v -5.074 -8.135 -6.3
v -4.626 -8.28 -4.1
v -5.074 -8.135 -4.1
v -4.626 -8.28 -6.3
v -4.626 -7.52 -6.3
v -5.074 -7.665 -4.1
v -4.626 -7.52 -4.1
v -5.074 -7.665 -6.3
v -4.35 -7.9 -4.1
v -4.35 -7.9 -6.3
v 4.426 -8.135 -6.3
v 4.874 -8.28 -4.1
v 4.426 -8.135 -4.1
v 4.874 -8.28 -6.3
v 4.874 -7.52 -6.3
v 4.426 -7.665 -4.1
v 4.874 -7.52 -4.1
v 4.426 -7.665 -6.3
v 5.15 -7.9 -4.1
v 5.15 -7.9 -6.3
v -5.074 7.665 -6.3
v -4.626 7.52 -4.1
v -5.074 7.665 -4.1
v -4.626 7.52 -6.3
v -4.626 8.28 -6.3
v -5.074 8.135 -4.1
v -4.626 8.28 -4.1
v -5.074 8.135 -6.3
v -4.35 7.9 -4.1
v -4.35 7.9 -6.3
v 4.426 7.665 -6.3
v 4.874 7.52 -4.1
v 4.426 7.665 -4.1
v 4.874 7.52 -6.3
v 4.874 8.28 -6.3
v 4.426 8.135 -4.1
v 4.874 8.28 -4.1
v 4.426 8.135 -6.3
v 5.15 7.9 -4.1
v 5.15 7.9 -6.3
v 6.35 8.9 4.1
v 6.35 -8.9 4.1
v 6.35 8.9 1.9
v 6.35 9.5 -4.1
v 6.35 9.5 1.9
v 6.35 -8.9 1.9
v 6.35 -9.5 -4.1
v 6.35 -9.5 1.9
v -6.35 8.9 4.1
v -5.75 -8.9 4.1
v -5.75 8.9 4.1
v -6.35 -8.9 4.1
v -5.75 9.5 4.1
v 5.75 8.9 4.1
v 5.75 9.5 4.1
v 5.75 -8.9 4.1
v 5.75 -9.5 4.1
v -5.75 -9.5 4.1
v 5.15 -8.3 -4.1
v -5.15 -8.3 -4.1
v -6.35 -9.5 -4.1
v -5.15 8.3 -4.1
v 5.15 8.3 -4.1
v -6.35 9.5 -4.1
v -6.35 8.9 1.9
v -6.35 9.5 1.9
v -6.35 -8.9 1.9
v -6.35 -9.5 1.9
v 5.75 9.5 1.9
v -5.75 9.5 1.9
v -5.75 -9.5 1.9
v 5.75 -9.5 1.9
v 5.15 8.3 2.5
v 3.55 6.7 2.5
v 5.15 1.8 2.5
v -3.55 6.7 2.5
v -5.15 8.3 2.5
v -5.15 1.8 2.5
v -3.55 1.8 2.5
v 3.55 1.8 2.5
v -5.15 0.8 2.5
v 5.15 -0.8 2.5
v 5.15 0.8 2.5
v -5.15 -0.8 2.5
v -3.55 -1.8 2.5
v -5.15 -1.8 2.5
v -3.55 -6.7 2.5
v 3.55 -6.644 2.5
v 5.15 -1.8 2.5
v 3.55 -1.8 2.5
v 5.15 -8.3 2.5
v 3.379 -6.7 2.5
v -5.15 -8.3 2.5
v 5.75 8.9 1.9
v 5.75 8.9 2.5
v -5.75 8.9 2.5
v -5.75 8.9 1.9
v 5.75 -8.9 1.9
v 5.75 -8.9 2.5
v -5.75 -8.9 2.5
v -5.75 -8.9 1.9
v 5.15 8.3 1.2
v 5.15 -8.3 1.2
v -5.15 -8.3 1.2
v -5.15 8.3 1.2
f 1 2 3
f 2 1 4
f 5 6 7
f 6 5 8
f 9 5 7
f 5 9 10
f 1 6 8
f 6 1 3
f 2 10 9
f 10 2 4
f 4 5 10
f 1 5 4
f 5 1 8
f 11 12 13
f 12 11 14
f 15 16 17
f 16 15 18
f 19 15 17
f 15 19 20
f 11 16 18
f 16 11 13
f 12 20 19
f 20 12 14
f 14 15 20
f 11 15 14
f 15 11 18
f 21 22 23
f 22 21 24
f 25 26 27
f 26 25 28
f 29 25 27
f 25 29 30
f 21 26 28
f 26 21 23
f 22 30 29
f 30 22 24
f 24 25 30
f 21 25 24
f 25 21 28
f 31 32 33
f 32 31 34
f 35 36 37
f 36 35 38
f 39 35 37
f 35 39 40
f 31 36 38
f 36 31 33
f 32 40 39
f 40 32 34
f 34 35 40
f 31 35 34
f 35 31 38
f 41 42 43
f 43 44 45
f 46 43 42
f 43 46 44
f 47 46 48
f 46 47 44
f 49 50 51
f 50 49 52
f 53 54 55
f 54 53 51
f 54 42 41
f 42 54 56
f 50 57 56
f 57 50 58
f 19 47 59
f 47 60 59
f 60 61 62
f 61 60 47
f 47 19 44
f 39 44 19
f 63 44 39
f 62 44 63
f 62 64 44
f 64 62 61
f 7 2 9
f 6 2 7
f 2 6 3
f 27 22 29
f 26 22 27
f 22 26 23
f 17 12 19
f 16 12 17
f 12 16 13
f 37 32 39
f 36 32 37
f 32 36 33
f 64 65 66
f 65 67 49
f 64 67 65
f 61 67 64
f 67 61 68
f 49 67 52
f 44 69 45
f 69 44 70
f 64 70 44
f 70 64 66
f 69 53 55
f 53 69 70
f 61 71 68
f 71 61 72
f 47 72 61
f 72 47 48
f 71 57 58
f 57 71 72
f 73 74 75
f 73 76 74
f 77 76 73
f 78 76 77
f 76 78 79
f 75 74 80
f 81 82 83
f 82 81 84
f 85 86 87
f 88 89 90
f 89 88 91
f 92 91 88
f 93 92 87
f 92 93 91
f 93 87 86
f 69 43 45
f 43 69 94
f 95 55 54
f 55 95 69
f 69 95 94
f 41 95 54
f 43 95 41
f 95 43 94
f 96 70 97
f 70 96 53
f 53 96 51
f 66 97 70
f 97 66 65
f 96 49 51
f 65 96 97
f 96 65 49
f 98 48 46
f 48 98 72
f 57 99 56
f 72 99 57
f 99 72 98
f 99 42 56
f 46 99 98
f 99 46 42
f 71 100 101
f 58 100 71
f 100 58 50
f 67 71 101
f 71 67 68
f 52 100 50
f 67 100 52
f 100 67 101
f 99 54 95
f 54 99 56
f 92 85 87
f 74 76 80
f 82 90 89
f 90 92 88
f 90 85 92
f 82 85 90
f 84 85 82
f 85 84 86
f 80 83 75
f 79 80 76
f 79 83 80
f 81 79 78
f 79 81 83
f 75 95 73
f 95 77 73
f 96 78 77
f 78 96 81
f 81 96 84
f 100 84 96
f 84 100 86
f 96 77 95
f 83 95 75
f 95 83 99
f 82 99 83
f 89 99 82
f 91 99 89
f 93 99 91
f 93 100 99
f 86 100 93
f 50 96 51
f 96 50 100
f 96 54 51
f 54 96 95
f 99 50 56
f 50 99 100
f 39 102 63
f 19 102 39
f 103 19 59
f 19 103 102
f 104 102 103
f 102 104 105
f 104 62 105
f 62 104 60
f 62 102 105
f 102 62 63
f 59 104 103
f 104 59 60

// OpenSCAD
// Parameters
body_W = 12.7; //[6.35:25.4:0.1]
body_H = 19.0; //[9.5:38.0:0.1]
body_D = 8.2; //[4.1:16.4:0.1]
recess_depth = 0.8; //[0.4:1.6:0.1]
recess_margin = 0.6; //[0.3:1.2:0.1]
segment_relief_depth = 0.4; //[0.2:1.0:0.1]
segment_thickness = 1.6; //[0.8:3.2:0.1]
segment_gap = 0.6; //[0.3:1.2:0.1]
dp_diameter = 2.0; //[1.0:4.0:0.1]
pin_diameter = 0.8; //[0.5:1.6:0.1]
pin_length = 3.0; //[1.5:6.0:0.1]
pin_inset = 1.6; //[0.8:3.2:0.1]
rear_cavity_depth = 4.5; //[2.0:7.5:0.1]
rear_wall = 1.2; //[0.6:2.4:0.1]
chamfer_size = 0.6; //[0.3:1.2:0.1]
overlap = 0.8; //[0.5:2.0:0.1]

// Base Shapes
module display_body() {
  cube([body_W, body_H, body_D], center=true);
}

module front_face_recess() {
  translate([0, 0, body_D/2 - (recess_depth + overlap)/2])
    cube([body_W - 2*recess_margin, body_H - 2*recess_margin, recess_depth + overlap], center=true);
}

module seg_top() {
  translate([0, (body_H - 2*recess_margin)/2 - segment_gap - segment_thickness/2, body_D/2 - recess_depth + (segment_relief_depth + overlap)/2 - overlap])
    cube([(body_W - 2*recess_margin) - 2*segment_gap, segment_thickness, segment_relief_depth + overlap], center=true);
}

module seg_mid() {
  translate([0, 0, body_D/2 - recess_depth + (segment_relief_depth + overlap)/2 - overlap])
    cube([(body_W - 2*recess_margin) - 2*segment_gap, segment_thickness, segment_relief_depth + overlap], center=true);
}

module seg_bot() {
  translate([0, -((body_H - 2*recess_margin)/2 - segment_gap - segment_thickness/2), body_D/2 - recess_depth + (segment_relief_depth + overlap)/2 - overlap])
    cube([(body_W - 2*recess_margin) - 2*segment_gap, segment_thickness, segment_relief_depth + overlap], center=true);
}

module seg_ul() {
  translate([-((body_W - 2*recess_margin)/2 - segment_gap - segment_thickness/2), ((body_H - 2*recess_margin)/4), body_D/2 - recess_depth + (segment_relief_depth + overlap)/2 - overlap])
    cube([segment_thickness, ((body_H - 2*recess_margin) - 3*segment_thickness - 4*segment_gap)/2, segment_relief_depth + overlap], center=true);
}

module seg_ur() {
  translate([((body_W - 2*recess_margin)/2 - segment_gap - segment_thickness/2), ((body_H - 2*recess_margin)/4), body_D/2 - recess_depth + (segment_relief_depth + overlap)/2 - overlap])
    cube([segment_thickness, ((body_H - 2*recess_margin) - 3*segment_thickness - 4*segment_gap)/2, segment_relief_depth + overlap], center=true);
}

module seg_ll() {
  translate([-((body_W - 2*recess_margin)/2 - segment_gap - segment_thickness/2), -((body_H - 2*recess_margin)/4), body_D/2 - recess_depth + (segment_relief_depth + overlap)/2 - overlap])
    cube([segment_thickness, ((body_H - 2*recess_margin) - 3*segment_thickness - 4*segment_gap)/2, segment_relief_depth + overlap], center=true);
}

module seg_lr() {
  translate([((body_W - 2*recess_margin)/2 - segment_gap - segment_thickness/2), -((body_H - 2*recess_margin)/4), body_D/2 - recess_depth + (segment_relief_depth + overlap)/2 - overlap])
    cube([segment_thickness, ((body_H - 2*recess_margin) - 3*segment_thickness - 4*segment_gap)/2, segment_relief_depth + overlap], center=true);
}

module decimal_point() {
  translate([(body_W - 2*recess_margin)/2 - segment_gap - dp_diameter/2, -((body_H - 2*recess_margin)/2 - segment_gap - dp_diameter/2), body_D/2 - recess_depth + (segment_relief_depth + overlap)/2 - overlap])
    cylinder(r=dp_diameter/2, h=segment_relief_depth + overlap, center=true);
}

module rear_cavity() {
  translate([0, 0, -body_D/2 + (rear_cavity_depth + overlap)/2])
    cube([body_W - 2*rear_wall, body_H - 2*rear_wall, rear_cavity_depth + overlap], center=true);
}

module pin(position) {
  translate(position)
    cylinder(r=pin_diameter/2, h=pin_length, center=true);
}

module chamfer_cut(position) {
  translate(position)
    cube([chamfer_size, chamfer_size, recess_depth + chamfer_size + overlap], center=true);
}

// Operations
module individual_segments() {
  union() {
    seg_top();
    seg_mid();
    seg_bot();
    seg_ul();
    seg_ur();
    seg_ll();
    seg_lr();
  }
}

module mounting_pins() {
  union() {
    pin([-(body_W/2 - pin_inset), -(body_H/2 - pin_inset), -body_D/2 - pin_length/2 + overlap]);
    pin([(body_W/2 - pin_inset), -(body_H/2 - pin_inset), -body_D/2 - pin_length/2 + overlap]);
    pin([-(body_W/2 - pin_inset), (body_H/2 - pin_inset), -body_D/2 - pin_length/2 + overlap]);
    pin([(body_W/2 - pin_inset), (body_H/2 - pin_inset), -body_D/2 - pin_length/2 + overlap]);
  }
}

module bezel_chamfers() {
  union() {
    chamfer_cut([body_W/2 - chamfer_size/2, body_H/2 - chamfer_size/2, body_D/2 - (recess_depth + chamfer_size + overlap)/2]);
    chamfer_cut([-(body_W/2 - chamfer_size/2), body_H/2 - chamfer_size/2, body_D/2 - (recess_depth + chamfer_size + overlap)/2]);
    chamfer_cut([body_W/2 - chamfer_size/2, -(body_H/2 - chamfer_size/2), body_D/2 - (recess_depth + chamfer_size + overlap)/2]);
    chamfer_cut([-(body_W/2 - chamfer_size/2), -(body_H/2 - chamfer_size/2), body_D/2 - (recess_depth + chamfer_size + overlap)/2]);
  }
}

module body_with_pins() {
  union() {
    display_body();
    mounting_pins();
  }
}

module front_detail_cuts() {
  union() {
    front_face_recess();
    individual_segments();
    decimal_point();
    bezel_chamfers();
  }
}

module housing_with_front_details() {
  difference() {
    body_with_pins();
    front_detail_cuts();
  }
}

module complete_model() {
  difference() {
    housing_with_front_details();
    rear_cavity();
  }
}

// Final Output
complete_model();
